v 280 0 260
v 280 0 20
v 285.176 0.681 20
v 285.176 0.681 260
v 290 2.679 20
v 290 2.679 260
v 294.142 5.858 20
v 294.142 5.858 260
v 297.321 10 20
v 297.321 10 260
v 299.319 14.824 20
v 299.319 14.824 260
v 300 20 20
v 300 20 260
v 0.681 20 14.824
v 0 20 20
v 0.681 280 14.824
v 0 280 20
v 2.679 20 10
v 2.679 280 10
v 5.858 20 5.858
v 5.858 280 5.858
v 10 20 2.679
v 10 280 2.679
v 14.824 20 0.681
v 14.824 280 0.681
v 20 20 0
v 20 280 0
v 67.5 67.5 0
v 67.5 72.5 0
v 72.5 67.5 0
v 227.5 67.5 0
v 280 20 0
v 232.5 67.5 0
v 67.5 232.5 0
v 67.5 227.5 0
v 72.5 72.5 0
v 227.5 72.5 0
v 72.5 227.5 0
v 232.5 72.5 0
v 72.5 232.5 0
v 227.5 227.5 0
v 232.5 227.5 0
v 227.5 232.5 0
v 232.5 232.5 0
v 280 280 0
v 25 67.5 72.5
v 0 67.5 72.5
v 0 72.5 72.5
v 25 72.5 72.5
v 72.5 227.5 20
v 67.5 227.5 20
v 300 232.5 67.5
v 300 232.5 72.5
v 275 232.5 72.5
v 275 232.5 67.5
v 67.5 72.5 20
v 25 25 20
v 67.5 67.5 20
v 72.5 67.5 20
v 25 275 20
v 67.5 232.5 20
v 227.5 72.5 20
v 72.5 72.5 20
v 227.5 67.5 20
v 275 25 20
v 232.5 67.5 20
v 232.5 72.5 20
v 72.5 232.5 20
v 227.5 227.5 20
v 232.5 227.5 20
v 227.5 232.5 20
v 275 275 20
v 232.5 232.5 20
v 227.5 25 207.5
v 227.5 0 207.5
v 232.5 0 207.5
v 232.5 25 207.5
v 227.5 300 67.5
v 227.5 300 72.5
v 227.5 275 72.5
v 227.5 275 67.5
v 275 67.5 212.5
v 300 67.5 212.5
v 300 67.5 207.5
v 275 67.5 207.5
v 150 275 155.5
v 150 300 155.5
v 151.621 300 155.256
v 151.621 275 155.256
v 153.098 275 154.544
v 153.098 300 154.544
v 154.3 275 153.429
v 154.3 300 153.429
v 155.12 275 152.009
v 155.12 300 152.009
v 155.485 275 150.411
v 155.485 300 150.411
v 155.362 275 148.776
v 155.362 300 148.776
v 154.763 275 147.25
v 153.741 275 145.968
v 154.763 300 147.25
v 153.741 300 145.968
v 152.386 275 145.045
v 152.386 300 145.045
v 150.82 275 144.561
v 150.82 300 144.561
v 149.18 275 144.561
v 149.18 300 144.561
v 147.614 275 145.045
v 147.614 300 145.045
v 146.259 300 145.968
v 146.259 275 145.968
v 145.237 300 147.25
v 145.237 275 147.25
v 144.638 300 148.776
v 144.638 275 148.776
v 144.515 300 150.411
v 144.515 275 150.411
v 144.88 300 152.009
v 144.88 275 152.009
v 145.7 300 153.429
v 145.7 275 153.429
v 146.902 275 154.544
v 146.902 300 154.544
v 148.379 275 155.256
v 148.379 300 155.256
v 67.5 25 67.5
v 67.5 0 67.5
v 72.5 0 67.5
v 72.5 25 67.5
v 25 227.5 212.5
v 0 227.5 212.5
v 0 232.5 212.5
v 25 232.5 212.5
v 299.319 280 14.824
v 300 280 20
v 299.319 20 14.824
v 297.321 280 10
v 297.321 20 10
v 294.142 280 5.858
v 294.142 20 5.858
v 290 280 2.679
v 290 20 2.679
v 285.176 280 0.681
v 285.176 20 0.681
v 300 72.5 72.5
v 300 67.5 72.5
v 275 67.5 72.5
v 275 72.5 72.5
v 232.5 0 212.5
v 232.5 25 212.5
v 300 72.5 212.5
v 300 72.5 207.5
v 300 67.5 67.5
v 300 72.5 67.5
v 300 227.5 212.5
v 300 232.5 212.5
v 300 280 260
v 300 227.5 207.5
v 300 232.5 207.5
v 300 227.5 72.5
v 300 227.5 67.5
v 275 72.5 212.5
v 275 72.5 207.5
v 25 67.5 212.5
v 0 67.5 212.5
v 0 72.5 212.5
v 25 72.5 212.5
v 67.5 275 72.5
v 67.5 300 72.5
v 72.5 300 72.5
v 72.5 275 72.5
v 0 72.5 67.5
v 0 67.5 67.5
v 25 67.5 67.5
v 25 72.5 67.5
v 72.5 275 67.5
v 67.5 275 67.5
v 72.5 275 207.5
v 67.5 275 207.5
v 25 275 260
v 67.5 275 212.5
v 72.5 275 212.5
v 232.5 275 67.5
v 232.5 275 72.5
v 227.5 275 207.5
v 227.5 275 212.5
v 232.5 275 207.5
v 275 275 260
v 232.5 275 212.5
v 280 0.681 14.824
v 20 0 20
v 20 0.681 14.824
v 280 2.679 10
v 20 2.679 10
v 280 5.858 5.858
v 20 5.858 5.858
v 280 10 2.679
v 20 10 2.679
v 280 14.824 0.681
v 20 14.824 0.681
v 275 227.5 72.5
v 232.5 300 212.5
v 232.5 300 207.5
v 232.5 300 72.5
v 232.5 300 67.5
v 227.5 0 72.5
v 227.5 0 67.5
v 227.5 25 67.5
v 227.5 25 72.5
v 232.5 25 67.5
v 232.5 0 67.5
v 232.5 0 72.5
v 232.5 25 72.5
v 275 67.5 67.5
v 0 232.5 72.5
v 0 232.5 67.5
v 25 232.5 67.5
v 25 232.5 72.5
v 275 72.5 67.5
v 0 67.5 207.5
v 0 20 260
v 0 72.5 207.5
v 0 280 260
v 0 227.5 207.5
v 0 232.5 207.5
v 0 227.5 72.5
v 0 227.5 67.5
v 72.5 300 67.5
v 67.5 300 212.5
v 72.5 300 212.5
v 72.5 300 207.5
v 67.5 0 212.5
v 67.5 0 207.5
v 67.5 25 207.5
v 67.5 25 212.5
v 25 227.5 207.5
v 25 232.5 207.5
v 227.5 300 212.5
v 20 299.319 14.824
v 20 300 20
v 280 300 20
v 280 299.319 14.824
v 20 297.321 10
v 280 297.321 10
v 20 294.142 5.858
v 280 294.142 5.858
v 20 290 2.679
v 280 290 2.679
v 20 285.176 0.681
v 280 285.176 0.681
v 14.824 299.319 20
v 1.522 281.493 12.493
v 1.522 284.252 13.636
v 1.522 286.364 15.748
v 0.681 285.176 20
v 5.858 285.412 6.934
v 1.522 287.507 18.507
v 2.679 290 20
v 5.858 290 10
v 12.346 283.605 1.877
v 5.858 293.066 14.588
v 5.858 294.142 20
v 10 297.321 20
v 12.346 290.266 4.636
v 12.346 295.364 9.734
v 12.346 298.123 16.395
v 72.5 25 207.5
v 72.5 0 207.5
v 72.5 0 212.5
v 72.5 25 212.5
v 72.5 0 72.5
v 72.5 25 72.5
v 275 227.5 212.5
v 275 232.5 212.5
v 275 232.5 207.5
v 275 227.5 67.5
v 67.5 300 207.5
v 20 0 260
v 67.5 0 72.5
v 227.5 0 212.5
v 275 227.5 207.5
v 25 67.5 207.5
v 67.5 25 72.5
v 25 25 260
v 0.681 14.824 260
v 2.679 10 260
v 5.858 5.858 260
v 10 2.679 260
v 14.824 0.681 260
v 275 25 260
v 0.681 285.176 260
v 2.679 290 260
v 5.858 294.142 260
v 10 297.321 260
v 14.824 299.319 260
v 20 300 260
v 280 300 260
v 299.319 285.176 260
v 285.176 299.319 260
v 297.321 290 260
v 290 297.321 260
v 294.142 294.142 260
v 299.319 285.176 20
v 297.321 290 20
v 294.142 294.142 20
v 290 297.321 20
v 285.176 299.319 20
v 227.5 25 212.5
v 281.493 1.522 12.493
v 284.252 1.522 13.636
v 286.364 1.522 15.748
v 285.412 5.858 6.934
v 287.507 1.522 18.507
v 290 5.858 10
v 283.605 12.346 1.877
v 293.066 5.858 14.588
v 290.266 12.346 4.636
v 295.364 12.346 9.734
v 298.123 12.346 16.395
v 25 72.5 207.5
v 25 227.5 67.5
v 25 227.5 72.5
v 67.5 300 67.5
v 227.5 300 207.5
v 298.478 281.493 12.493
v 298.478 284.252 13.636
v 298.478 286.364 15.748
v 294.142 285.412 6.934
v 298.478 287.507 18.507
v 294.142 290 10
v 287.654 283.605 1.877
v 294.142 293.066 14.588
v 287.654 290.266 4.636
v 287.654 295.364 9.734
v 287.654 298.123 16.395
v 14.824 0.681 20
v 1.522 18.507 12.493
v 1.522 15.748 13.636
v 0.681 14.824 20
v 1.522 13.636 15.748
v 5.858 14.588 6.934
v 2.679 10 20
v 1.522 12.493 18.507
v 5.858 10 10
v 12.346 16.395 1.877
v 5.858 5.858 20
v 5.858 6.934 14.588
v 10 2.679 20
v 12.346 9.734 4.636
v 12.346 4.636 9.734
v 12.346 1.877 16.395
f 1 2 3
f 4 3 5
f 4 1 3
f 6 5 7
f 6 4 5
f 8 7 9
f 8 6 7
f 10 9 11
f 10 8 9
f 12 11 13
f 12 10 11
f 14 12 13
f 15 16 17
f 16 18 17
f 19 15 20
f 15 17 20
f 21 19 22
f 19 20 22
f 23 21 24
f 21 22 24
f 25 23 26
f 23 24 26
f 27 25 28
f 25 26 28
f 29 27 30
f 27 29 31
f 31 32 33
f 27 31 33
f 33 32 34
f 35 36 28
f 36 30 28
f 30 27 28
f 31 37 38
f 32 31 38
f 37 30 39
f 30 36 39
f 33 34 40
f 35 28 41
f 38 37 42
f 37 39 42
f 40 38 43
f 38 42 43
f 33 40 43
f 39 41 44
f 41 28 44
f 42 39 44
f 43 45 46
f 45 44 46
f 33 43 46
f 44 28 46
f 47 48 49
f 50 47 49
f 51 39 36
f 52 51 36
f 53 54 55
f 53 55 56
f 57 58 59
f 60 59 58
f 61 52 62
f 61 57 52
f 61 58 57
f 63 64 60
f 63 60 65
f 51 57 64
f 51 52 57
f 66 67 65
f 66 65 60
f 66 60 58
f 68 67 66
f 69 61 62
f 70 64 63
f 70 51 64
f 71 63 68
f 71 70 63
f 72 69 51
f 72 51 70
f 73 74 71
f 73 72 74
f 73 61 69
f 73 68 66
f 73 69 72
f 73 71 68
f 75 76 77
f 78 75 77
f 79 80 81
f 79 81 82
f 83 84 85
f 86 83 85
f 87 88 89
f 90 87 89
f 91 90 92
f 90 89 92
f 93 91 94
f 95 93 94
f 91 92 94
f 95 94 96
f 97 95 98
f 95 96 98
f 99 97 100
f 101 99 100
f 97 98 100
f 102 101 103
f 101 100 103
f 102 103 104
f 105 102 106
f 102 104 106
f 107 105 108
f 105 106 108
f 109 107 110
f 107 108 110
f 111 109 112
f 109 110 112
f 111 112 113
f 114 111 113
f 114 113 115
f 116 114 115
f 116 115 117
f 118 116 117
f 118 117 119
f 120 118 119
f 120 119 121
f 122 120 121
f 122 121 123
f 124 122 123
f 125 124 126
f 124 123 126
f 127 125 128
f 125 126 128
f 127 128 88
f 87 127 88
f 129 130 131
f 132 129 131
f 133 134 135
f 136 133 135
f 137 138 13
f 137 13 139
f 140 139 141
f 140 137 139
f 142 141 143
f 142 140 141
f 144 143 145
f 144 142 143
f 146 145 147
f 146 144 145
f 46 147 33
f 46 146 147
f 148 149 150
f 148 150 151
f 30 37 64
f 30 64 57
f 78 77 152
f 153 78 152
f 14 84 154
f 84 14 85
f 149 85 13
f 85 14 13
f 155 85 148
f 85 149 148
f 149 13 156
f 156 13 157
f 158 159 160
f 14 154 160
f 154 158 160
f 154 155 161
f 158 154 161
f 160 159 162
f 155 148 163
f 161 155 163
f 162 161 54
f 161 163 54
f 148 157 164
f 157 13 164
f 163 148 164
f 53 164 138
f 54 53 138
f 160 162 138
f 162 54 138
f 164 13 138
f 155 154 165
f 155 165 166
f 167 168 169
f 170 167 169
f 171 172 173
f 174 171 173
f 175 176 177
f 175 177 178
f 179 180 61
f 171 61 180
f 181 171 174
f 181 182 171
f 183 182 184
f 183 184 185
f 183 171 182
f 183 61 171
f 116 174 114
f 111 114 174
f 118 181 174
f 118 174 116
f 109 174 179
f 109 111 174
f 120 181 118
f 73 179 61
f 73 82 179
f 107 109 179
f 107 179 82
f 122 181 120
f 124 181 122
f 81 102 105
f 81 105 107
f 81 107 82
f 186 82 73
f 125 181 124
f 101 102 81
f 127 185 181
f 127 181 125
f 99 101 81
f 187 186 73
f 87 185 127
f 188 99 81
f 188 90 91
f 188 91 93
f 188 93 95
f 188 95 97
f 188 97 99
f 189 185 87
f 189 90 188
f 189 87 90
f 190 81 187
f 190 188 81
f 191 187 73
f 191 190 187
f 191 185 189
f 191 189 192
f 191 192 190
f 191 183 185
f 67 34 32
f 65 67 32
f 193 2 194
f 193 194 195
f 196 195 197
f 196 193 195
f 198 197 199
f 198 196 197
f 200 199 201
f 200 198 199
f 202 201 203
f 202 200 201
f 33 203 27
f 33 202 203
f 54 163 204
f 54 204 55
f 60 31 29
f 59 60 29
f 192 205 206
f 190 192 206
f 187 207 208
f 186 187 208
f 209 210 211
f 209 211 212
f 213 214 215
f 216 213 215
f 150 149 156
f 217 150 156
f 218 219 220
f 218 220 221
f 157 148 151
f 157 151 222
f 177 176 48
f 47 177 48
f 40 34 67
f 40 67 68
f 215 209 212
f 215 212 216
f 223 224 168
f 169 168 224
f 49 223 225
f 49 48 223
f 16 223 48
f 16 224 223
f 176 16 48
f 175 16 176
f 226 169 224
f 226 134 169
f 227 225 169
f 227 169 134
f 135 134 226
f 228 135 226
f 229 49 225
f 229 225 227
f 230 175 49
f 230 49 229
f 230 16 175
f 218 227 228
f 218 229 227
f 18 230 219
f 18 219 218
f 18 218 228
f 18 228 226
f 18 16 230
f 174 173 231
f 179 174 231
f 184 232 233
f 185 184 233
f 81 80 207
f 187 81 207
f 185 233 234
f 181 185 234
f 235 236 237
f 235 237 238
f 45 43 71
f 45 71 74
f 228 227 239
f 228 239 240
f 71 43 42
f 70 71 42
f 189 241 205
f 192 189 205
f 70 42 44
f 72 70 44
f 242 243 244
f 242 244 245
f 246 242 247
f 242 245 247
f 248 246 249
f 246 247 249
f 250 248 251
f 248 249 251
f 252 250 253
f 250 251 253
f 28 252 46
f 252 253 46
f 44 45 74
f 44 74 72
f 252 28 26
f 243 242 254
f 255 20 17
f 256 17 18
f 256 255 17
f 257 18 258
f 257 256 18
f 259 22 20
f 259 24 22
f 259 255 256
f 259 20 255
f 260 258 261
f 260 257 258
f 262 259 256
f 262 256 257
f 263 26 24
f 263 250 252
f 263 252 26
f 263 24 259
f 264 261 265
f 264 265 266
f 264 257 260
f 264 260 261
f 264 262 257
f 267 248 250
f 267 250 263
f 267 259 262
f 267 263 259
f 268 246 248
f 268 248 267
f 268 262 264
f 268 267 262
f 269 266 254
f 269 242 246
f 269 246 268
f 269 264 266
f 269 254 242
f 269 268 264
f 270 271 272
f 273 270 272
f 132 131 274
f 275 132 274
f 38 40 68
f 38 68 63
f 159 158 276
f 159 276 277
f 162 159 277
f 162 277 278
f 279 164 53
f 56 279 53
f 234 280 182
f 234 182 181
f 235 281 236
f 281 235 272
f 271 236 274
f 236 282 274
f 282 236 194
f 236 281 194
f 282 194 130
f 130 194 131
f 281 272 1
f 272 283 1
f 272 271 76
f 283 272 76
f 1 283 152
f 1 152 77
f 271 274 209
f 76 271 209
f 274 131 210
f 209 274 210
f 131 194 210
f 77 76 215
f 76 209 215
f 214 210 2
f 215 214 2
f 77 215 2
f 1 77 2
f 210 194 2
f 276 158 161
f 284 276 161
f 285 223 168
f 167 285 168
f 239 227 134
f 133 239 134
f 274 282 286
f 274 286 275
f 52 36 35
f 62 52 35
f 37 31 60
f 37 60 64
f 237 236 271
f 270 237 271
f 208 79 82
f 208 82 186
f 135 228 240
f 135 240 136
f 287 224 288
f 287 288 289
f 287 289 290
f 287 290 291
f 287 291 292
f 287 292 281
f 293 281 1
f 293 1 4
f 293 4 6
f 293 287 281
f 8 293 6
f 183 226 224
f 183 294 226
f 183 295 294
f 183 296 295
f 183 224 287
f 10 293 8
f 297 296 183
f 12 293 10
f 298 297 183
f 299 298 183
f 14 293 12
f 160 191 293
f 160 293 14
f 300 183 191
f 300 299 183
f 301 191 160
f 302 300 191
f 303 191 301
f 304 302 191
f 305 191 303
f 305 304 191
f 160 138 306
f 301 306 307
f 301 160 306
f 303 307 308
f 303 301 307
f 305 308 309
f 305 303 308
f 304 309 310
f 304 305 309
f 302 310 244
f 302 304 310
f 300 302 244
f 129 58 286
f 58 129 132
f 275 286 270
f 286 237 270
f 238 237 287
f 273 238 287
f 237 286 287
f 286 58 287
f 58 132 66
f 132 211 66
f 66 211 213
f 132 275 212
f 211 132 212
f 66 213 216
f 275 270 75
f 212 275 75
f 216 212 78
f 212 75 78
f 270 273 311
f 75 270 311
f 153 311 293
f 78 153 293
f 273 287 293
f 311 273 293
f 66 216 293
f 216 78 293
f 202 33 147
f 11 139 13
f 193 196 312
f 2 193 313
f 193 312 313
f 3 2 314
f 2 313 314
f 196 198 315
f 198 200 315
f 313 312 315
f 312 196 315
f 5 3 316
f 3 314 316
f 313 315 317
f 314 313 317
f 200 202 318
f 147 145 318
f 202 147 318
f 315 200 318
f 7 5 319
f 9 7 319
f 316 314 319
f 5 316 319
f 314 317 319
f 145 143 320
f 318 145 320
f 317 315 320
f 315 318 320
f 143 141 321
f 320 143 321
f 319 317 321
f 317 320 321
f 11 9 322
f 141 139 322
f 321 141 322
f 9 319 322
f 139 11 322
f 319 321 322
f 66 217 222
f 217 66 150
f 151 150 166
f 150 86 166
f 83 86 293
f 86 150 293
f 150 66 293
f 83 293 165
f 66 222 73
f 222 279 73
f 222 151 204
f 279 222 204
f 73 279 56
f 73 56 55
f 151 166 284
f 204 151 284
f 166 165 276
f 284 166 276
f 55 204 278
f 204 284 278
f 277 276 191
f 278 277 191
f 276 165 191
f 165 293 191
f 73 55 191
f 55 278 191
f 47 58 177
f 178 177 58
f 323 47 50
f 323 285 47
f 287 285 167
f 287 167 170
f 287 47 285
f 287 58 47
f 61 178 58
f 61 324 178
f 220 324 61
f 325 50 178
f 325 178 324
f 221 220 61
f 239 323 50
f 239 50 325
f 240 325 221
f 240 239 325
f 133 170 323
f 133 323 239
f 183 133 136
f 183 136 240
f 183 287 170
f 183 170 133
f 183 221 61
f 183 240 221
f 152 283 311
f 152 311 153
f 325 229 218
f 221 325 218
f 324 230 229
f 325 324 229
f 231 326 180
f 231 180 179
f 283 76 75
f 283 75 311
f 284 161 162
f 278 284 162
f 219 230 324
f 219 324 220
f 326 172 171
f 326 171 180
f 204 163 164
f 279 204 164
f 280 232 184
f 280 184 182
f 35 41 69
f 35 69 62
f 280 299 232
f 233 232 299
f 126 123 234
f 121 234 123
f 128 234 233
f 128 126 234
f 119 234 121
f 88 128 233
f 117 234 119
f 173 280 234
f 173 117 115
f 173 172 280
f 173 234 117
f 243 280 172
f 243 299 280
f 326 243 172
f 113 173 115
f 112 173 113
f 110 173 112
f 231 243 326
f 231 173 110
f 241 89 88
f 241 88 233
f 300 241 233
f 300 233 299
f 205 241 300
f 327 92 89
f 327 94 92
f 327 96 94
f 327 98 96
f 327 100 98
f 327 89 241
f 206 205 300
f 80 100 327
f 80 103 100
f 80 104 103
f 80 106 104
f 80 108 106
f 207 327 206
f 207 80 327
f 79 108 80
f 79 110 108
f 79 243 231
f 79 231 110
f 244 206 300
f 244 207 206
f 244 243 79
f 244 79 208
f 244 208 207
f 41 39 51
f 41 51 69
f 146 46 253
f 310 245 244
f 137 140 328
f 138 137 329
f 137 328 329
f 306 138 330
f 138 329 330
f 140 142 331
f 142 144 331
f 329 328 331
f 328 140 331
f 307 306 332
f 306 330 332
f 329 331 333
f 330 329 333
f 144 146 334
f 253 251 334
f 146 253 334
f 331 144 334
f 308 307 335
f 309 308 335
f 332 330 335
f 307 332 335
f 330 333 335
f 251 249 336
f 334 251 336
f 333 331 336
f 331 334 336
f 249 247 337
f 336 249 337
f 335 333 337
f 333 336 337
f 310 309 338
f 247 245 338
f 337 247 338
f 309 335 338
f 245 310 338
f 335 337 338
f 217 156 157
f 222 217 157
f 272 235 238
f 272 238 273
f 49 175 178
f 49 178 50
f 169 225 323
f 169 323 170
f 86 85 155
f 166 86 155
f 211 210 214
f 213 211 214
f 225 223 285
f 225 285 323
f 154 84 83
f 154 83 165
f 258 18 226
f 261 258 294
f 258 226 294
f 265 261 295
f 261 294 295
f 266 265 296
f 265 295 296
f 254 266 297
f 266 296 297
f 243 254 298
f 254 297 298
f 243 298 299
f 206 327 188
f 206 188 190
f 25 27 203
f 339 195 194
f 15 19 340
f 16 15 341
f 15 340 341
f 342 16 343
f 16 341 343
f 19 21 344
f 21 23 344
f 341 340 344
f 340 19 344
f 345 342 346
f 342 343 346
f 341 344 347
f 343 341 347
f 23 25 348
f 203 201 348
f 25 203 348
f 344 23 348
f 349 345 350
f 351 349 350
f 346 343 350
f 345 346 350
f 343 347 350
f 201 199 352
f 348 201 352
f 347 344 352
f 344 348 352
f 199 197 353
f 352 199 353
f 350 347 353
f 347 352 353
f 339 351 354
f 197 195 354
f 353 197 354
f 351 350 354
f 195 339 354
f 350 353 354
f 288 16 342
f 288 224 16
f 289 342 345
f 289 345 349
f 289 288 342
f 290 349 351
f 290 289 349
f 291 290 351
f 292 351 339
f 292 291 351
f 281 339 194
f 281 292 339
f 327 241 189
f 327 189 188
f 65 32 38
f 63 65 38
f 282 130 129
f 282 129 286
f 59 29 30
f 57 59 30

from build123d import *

# Parameters (mm, degrees)
SKETCH1_W           = 300
SKETCH1_H           = 300
BOSS_EXTRUDE1_DEPTH = 260
FILLET1_R           = 20
SKETCH2_W           = 250
SKETCH2_H           = 250
CUT_EXTRUDE1_DEPTH  = 240
SKETCH3_R           = 5.5
CUT_EXTRUDE2_DEPTH  = 25
SKETCH4_W           = 5
SKETCH4_H           = 5
CUT_EXTRUDE3_DEPTH  = 25
SKETCH6_W           = 5
SKETCH6_H           = 5
CUT_EXTRUDE4_DEPTH  = 25
SKETCH7_W           = 5
SKETCH7_H           = 5
CUT_EXTRUDE5_DEPTH  = 25
SKETCH8_W           = 5
SKETCH8_H           = 5
CUT_EXTRUDE6_DEPTH  = 25
SKETCH9_W           = 5
SKETCH9_H           = 5
CUT_EXTRUDE7_DEPTH  = 20


with BuildPart() as part:
    # Sketch1 → Boss-Extrude1 (new body)
    with BuildSketch(Plane.XY):
        with Locations((150, 150)):
            Rectangle(SKETCH1_W, SKETCH1_H)
    extrude(amount=BOSS_EXTRUDE1_DEPTH)

    # Fillet1
    fillet1_edges = [part.edges().sort_by_distance(p)[0] for p in [
        (150, 300, 0),
        (300, 150, 0),
        (150, 0, 0),
        (0, 150, 0),
        (0, 300, 130),
        (300, 300, 130),
        (300, 0, 130),
        (0, 0, 130),
    ]]
    fillet(fillet1_edges, radius=FILLET1_R)

    # Sketch2 → Cut-Extrude1 (cut)
    with BuildSketch(Plane.XY.offset(260)):
        with Locations((150, 150)):
            Rectangle(SKETCH2_W, SKETCH2_H)
    extrude(amount=-CUT_EXTRUDE1_DEPTH, mode=Mode.SUBTRACT)

    # Sketch3 → Cut-Extrude2 (cut)
    with BuildSketch(Plane(origin=(0, 300, 0), x_dir=(1, 0, 0), z_dir=(0, 1, 0))):
        with Locations(Location((150, -150, 0), (0, 0, 270))):
            Circle(SKETCH3_R)
    extrude(amount=-CUT_EXTRUDE2_DEPTH, mode=Mode.SUBTRACT)

    # Sketch4 → Cut-Extrude3 (cut)
    with BuildSketch(Plane(origin=(0, 300, 0), x_dir=(1, 0, 0), z_dir=(0, 1, 0))):
        with Locations((70, -70)):
            Rectangle(SKETCH4_W, SKETCH4_H)
        with Locations((70, -210)):
            Rectangle(SKETCH4_W, SKETCH4_H)
        with Locations((230, -70)):
            Rectangle(SKETCH4_W, SKETCH4_H)
        with Locations((230, -210)):
            Rectangle(SKETCH4_W, SKETCH4_H)
    extrude(amount=-CUT_EXTRUDE3_DEPTH, mode=Mode.SUBTRACT)

    # Sketch6 → Cut-Extrude4 (cut)
    with BuildSketch(Plane(origin=(300, 0, 0), x_dir=(0, 0, -1), z_dir=(1, 0, 0))):
        with Locations((-210, 230)):
            Rectangle(SKETCH6_W, SKETCH6_H)
        with Locations((-210, 70)):
            Rectangle(SKETCH6_W, SKETCH6_H)
        with Locations((-70, 230)):
            Rectangle(SKETCH6_W, SKETCH6_H)
        with Locations((-70, 70)):
            Rectangle(SKETCH6_W, SKETCH6_H)
    extrude(amount=-CUT_EXTRUDE4_DEPTH, mode=Mode.SUBTRACT)

    # Sketch7 → Cut-Extrude5 (cut)
    with BuildSketch(Plane.XZ):
        with Locations((70, 210)):
            Rectangle(SKETCH7_W, SKETCH7_H)
        with Locations((70, 70)):
            Rectangle(SKETCH7_W, SKETCH7_H)
        with Locations((230, 210)):
            Rectangle(SKETCH7_W, SKETCH7_H)
        with Locations((230, 70)):
            Rectangle(SKETCH7_W, SKETCH7_H)
    extrude(amount=-CUT_EXTRUDE5_DEPTH, mode=Mode.SUBTRACT)

    # Sketch8 → Cut-Extrude6 (cut)
    with BuildSketch(Plane.ZY):
        with Locations((70, 230)):
            Rectangle(SKETCH8_W, SKETCH8_H)
        with Locations((70, 70)):
            Rectangle(SKETCH8_W, SKETCH8_H)
        with Locations((210, 230)):
            Rectangle(SKETCH8_W, SKETCH8_H)
        with Locations((210, 70)):
            Rectangle(SKETCH8_W, SKETCH8_H)
    extrude(amount=-CUT_EXTRUDE6_DEPTH, mode=Mode.SUBTRACT)

    # Sketch9 → Cut-Extrude7 (cut)
    with BuildSketch(Plane(origin=(0, 0, 0), x_dir=(-1, 0, 0), z_dir=(0, 0, -1))):
        with Locations((-230, 230)):
            Rectangle(SKETCH9_W, SKETCH9_H)
        with Locations((-230, 70)):
            Rectangle(SKETCH9_W, SKETCH9_H)
        with Locations((-70, 230)):
            Rectangle(SKETCH9_W, SKETCH9_H)
        with Locations((-70, 70)):
            Rectangle(SKETCH9_W, SKETCH9_H)
    extrude(amount=-CUT_EXTRUDE7_DEPTH, mode=Mode.SUBTRACT)


solid = part.part
